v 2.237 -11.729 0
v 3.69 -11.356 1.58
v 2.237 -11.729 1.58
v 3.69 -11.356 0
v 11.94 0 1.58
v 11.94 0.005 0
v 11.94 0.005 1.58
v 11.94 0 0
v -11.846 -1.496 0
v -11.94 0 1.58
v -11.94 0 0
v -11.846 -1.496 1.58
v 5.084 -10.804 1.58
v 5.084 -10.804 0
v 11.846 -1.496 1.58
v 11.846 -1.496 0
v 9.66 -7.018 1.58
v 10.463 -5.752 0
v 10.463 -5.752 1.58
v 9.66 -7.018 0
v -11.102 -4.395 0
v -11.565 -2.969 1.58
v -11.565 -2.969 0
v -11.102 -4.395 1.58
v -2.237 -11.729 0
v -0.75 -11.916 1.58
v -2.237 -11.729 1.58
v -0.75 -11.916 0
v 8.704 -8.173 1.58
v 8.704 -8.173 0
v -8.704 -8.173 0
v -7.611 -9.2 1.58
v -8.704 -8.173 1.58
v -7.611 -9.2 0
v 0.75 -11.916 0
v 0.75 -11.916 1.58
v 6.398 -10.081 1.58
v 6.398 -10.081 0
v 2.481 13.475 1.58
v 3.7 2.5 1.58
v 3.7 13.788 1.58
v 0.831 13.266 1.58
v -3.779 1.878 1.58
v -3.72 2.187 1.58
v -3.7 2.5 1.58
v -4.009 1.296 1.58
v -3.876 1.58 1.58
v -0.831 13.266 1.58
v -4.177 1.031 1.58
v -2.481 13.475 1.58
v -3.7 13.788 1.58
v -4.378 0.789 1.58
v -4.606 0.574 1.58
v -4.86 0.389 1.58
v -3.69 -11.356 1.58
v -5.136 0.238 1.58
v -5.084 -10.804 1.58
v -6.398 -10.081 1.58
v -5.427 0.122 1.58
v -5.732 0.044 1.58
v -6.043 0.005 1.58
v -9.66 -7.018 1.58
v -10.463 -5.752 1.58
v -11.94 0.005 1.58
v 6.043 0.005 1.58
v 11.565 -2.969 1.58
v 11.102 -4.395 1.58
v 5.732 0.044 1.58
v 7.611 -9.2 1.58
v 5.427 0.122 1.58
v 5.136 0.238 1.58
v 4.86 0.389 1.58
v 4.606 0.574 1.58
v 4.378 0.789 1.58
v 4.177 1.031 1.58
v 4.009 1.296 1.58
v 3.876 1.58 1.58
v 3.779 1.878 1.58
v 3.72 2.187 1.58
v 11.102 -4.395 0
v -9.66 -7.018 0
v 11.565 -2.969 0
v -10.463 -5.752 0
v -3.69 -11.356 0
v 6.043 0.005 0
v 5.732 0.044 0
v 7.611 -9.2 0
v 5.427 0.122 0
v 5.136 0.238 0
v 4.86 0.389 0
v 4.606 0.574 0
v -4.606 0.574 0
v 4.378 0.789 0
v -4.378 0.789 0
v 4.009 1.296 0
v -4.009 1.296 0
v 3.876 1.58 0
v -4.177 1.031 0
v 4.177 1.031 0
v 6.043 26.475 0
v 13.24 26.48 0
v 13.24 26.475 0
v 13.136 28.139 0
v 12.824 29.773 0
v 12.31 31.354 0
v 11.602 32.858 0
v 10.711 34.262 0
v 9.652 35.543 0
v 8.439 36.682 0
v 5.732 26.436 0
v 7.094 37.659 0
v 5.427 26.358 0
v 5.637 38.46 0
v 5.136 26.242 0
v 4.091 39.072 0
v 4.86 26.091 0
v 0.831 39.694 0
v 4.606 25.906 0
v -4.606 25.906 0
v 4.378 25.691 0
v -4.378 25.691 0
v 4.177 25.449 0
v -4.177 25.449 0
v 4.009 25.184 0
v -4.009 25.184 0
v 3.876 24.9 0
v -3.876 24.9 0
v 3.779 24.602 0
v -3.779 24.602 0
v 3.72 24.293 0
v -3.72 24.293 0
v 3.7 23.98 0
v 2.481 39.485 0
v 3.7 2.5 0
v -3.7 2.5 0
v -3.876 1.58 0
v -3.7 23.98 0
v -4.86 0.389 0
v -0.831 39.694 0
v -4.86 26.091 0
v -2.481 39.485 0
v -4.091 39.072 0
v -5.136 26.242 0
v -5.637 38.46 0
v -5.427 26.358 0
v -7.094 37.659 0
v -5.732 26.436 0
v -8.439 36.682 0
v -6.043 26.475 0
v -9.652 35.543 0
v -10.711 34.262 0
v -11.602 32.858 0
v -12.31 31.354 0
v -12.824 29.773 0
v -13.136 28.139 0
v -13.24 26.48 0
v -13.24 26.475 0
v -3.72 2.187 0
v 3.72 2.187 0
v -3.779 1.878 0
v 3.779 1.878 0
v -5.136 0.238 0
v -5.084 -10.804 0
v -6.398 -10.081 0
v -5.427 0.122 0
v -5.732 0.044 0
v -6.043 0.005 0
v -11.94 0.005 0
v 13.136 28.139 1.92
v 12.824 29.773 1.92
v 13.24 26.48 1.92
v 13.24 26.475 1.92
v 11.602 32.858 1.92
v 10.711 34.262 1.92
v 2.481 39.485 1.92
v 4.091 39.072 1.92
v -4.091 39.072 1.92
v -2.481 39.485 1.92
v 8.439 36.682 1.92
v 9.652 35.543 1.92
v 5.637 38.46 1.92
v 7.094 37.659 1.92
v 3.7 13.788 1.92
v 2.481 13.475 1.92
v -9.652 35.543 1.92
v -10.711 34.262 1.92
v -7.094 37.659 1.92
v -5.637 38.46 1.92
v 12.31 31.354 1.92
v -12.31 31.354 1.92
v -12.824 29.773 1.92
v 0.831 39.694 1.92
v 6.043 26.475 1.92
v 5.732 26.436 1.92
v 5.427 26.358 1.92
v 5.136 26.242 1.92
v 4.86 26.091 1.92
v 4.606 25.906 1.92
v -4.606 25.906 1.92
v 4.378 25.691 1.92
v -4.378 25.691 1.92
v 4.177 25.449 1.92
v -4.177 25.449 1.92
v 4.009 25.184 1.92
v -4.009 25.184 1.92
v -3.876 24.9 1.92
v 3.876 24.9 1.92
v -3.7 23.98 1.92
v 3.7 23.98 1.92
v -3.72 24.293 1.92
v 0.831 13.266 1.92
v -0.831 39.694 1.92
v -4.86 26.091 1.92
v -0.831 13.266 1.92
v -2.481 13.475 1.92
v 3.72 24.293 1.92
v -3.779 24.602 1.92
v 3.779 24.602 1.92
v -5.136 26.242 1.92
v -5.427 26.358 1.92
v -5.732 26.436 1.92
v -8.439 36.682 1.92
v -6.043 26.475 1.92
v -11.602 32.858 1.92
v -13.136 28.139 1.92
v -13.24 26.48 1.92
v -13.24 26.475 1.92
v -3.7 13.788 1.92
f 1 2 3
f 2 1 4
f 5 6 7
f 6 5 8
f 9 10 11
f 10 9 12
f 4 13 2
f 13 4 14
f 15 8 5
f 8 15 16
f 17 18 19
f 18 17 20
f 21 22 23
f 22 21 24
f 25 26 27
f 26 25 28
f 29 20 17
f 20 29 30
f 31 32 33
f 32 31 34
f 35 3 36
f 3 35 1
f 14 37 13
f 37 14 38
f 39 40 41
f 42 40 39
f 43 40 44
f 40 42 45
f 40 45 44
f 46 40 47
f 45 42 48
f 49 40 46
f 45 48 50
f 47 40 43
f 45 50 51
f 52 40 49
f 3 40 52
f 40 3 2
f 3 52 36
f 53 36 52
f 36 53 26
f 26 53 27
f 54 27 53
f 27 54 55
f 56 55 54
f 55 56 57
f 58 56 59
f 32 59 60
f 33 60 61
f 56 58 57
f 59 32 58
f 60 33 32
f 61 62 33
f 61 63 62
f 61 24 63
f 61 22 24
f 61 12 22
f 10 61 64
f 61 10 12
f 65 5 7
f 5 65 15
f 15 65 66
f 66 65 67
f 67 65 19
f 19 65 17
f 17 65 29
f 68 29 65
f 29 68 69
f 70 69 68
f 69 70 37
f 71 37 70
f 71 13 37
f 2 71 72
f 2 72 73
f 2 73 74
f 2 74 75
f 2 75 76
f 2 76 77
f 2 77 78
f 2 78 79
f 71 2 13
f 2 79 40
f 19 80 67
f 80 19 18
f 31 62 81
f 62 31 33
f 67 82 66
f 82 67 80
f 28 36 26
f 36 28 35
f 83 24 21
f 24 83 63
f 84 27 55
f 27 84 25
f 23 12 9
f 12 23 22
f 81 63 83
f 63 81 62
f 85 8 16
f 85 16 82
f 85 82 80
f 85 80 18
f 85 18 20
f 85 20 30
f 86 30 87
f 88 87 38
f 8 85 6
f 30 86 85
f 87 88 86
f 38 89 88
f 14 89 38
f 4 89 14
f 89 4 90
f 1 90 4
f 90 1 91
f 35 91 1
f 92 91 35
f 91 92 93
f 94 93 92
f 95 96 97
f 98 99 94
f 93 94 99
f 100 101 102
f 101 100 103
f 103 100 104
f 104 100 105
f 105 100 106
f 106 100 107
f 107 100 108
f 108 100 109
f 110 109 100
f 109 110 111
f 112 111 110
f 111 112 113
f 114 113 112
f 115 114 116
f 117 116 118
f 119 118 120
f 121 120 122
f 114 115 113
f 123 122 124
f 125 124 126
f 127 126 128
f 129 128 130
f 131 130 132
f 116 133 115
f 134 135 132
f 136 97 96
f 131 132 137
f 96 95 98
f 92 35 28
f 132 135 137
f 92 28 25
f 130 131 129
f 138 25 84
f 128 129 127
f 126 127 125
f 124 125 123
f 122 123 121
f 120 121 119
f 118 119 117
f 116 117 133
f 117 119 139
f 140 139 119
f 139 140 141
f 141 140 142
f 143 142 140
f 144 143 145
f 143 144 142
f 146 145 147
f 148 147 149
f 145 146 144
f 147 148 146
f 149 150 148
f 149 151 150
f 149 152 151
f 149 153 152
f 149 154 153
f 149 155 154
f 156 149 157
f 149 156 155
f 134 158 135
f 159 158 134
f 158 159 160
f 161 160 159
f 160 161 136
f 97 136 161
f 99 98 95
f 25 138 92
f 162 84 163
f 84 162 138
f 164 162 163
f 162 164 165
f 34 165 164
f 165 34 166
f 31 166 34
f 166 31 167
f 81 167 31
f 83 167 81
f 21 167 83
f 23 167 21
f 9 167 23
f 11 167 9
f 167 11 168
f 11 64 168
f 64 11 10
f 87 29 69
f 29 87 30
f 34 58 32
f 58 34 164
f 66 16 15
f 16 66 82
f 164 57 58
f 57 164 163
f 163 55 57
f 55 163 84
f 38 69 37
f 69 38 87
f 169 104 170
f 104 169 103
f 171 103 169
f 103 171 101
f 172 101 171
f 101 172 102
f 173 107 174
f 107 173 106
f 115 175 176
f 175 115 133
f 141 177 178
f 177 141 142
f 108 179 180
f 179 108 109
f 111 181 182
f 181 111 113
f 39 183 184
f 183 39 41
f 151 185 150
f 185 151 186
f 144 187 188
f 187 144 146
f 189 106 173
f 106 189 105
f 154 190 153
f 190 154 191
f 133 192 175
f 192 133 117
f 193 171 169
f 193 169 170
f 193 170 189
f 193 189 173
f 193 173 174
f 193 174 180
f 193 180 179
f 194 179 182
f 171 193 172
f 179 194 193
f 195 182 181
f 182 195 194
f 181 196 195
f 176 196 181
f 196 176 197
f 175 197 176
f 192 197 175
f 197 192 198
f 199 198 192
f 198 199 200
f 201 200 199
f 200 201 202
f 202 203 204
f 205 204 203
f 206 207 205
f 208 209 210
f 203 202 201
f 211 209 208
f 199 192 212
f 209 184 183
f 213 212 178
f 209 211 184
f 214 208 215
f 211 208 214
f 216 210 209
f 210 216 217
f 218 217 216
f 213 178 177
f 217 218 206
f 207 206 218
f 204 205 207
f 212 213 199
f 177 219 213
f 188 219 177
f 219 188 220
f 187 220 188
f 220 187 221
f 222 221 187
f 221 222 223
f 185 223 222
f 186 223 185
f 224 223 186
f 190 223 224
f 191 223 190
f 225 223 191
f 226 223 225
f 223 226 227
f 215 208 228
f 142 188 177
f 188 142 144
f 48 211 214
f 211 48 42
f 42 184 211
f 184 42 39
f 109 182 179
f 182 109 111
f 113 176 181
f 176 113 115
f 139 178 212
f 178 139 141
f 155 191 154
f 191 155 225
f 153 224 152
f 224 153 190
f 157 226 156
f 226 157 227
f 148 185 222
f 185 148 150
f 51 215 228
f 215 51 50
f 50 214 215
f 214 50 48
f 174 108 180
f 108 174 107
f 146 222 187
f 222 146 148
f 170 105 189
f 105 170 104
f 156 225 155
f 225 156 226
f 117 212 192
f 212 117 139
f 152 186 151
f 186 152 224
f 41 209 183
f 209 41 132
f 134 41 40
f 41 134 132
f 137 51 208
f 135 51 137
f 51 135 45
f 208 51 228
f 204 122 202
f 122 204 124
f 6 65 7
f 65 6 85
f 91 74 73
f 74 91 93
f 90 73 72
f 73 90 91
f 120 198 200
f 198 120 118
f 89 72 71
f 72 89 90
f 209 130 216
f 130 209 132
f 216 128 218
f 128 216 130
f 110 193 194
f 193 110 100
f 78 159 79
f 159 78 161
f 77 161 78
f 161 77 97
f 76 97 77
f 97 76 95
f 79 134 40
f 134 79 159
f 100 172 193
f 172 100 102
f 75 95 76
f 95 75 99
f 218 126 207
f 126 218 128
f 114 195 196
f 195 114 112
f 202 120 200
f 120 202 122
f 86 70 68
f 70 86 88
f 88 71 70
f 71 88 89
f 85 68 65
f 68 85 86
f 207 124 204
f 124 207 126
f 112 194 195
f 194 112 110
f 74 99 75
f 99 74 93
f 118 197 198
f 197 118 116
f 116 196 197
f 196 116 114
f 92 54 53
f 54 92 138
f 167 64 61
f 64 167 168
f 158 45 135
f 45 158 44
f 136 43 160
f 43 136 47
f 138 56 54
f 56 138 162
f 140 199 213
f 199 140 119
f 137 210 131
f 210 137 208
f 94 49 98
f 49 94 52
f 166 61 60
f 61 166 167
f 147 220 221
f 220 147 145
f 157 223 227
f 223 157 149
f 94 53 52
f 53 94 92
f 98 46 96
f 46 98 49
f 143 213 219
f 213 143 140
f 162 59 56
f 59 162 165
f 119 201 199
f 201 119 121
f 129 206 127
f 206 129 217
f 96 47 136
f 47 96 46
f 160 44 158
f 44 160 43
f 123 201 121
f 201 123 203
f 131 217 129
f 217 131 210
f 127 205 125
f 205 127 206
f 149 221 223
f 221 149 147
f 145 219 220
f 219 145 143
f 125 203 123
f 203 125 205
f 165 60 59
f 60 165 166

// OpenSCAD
// Coin 1
Dia1=23.88;
Thick1=1.58;
// Coin 2
Dia2=26.48;
Thick2=1.92;
// Print Setting
MinWall=1.2; //Minimum wall thickness
RingDia=5; //Key Ring Diameter
$fn=50;

// Calculations
Separation=max(Dia1,Dia2);
Thick=min(Thick1,Thick2);
MThick=max(Thick1,Thick2);

difference(){
    union(){
        cylinder(d=Dia1,h=Thick1);
        translate([0,Separation,0])cylinder(d=Dia2,h=Thick2);
        translate([-(RingDia+MinWall*2)/2,0,0])cube([RingDia+MinWall*2,Separation,Thick]);
    }
    union(){
        translate([RingDia+MinWall,RingDia/2,-MThick/2])minkowski(){
            cube([Separation-RingDia,Separation-RingDia,MThick]);
            cylinder(d=RingDia,h=MThick);
        }
        translate([-Separation-MinWall,RingDia/2,-MThick/2])minkowski(){
            cube([Separation-RingDia,Separation-RingDia,MThick]);
            cylinder(d=RingDia,h=MThick);
        }
        //translate([0,RingDia,-Thick/2])cylinder(d=RingDia,h=Thick*2);
        //translate([0,Separation-RingDia,-Thick/2])cylinder(d=RingDia,h=Thick*2);
        //translate([-RingDia/2,RingDia,-Thick/2])cube([RingDia,Separation-RingDia*2,Thick*2]);
    }
}


// Remix of http://www.thingiverse.com/thing:233194/#files
